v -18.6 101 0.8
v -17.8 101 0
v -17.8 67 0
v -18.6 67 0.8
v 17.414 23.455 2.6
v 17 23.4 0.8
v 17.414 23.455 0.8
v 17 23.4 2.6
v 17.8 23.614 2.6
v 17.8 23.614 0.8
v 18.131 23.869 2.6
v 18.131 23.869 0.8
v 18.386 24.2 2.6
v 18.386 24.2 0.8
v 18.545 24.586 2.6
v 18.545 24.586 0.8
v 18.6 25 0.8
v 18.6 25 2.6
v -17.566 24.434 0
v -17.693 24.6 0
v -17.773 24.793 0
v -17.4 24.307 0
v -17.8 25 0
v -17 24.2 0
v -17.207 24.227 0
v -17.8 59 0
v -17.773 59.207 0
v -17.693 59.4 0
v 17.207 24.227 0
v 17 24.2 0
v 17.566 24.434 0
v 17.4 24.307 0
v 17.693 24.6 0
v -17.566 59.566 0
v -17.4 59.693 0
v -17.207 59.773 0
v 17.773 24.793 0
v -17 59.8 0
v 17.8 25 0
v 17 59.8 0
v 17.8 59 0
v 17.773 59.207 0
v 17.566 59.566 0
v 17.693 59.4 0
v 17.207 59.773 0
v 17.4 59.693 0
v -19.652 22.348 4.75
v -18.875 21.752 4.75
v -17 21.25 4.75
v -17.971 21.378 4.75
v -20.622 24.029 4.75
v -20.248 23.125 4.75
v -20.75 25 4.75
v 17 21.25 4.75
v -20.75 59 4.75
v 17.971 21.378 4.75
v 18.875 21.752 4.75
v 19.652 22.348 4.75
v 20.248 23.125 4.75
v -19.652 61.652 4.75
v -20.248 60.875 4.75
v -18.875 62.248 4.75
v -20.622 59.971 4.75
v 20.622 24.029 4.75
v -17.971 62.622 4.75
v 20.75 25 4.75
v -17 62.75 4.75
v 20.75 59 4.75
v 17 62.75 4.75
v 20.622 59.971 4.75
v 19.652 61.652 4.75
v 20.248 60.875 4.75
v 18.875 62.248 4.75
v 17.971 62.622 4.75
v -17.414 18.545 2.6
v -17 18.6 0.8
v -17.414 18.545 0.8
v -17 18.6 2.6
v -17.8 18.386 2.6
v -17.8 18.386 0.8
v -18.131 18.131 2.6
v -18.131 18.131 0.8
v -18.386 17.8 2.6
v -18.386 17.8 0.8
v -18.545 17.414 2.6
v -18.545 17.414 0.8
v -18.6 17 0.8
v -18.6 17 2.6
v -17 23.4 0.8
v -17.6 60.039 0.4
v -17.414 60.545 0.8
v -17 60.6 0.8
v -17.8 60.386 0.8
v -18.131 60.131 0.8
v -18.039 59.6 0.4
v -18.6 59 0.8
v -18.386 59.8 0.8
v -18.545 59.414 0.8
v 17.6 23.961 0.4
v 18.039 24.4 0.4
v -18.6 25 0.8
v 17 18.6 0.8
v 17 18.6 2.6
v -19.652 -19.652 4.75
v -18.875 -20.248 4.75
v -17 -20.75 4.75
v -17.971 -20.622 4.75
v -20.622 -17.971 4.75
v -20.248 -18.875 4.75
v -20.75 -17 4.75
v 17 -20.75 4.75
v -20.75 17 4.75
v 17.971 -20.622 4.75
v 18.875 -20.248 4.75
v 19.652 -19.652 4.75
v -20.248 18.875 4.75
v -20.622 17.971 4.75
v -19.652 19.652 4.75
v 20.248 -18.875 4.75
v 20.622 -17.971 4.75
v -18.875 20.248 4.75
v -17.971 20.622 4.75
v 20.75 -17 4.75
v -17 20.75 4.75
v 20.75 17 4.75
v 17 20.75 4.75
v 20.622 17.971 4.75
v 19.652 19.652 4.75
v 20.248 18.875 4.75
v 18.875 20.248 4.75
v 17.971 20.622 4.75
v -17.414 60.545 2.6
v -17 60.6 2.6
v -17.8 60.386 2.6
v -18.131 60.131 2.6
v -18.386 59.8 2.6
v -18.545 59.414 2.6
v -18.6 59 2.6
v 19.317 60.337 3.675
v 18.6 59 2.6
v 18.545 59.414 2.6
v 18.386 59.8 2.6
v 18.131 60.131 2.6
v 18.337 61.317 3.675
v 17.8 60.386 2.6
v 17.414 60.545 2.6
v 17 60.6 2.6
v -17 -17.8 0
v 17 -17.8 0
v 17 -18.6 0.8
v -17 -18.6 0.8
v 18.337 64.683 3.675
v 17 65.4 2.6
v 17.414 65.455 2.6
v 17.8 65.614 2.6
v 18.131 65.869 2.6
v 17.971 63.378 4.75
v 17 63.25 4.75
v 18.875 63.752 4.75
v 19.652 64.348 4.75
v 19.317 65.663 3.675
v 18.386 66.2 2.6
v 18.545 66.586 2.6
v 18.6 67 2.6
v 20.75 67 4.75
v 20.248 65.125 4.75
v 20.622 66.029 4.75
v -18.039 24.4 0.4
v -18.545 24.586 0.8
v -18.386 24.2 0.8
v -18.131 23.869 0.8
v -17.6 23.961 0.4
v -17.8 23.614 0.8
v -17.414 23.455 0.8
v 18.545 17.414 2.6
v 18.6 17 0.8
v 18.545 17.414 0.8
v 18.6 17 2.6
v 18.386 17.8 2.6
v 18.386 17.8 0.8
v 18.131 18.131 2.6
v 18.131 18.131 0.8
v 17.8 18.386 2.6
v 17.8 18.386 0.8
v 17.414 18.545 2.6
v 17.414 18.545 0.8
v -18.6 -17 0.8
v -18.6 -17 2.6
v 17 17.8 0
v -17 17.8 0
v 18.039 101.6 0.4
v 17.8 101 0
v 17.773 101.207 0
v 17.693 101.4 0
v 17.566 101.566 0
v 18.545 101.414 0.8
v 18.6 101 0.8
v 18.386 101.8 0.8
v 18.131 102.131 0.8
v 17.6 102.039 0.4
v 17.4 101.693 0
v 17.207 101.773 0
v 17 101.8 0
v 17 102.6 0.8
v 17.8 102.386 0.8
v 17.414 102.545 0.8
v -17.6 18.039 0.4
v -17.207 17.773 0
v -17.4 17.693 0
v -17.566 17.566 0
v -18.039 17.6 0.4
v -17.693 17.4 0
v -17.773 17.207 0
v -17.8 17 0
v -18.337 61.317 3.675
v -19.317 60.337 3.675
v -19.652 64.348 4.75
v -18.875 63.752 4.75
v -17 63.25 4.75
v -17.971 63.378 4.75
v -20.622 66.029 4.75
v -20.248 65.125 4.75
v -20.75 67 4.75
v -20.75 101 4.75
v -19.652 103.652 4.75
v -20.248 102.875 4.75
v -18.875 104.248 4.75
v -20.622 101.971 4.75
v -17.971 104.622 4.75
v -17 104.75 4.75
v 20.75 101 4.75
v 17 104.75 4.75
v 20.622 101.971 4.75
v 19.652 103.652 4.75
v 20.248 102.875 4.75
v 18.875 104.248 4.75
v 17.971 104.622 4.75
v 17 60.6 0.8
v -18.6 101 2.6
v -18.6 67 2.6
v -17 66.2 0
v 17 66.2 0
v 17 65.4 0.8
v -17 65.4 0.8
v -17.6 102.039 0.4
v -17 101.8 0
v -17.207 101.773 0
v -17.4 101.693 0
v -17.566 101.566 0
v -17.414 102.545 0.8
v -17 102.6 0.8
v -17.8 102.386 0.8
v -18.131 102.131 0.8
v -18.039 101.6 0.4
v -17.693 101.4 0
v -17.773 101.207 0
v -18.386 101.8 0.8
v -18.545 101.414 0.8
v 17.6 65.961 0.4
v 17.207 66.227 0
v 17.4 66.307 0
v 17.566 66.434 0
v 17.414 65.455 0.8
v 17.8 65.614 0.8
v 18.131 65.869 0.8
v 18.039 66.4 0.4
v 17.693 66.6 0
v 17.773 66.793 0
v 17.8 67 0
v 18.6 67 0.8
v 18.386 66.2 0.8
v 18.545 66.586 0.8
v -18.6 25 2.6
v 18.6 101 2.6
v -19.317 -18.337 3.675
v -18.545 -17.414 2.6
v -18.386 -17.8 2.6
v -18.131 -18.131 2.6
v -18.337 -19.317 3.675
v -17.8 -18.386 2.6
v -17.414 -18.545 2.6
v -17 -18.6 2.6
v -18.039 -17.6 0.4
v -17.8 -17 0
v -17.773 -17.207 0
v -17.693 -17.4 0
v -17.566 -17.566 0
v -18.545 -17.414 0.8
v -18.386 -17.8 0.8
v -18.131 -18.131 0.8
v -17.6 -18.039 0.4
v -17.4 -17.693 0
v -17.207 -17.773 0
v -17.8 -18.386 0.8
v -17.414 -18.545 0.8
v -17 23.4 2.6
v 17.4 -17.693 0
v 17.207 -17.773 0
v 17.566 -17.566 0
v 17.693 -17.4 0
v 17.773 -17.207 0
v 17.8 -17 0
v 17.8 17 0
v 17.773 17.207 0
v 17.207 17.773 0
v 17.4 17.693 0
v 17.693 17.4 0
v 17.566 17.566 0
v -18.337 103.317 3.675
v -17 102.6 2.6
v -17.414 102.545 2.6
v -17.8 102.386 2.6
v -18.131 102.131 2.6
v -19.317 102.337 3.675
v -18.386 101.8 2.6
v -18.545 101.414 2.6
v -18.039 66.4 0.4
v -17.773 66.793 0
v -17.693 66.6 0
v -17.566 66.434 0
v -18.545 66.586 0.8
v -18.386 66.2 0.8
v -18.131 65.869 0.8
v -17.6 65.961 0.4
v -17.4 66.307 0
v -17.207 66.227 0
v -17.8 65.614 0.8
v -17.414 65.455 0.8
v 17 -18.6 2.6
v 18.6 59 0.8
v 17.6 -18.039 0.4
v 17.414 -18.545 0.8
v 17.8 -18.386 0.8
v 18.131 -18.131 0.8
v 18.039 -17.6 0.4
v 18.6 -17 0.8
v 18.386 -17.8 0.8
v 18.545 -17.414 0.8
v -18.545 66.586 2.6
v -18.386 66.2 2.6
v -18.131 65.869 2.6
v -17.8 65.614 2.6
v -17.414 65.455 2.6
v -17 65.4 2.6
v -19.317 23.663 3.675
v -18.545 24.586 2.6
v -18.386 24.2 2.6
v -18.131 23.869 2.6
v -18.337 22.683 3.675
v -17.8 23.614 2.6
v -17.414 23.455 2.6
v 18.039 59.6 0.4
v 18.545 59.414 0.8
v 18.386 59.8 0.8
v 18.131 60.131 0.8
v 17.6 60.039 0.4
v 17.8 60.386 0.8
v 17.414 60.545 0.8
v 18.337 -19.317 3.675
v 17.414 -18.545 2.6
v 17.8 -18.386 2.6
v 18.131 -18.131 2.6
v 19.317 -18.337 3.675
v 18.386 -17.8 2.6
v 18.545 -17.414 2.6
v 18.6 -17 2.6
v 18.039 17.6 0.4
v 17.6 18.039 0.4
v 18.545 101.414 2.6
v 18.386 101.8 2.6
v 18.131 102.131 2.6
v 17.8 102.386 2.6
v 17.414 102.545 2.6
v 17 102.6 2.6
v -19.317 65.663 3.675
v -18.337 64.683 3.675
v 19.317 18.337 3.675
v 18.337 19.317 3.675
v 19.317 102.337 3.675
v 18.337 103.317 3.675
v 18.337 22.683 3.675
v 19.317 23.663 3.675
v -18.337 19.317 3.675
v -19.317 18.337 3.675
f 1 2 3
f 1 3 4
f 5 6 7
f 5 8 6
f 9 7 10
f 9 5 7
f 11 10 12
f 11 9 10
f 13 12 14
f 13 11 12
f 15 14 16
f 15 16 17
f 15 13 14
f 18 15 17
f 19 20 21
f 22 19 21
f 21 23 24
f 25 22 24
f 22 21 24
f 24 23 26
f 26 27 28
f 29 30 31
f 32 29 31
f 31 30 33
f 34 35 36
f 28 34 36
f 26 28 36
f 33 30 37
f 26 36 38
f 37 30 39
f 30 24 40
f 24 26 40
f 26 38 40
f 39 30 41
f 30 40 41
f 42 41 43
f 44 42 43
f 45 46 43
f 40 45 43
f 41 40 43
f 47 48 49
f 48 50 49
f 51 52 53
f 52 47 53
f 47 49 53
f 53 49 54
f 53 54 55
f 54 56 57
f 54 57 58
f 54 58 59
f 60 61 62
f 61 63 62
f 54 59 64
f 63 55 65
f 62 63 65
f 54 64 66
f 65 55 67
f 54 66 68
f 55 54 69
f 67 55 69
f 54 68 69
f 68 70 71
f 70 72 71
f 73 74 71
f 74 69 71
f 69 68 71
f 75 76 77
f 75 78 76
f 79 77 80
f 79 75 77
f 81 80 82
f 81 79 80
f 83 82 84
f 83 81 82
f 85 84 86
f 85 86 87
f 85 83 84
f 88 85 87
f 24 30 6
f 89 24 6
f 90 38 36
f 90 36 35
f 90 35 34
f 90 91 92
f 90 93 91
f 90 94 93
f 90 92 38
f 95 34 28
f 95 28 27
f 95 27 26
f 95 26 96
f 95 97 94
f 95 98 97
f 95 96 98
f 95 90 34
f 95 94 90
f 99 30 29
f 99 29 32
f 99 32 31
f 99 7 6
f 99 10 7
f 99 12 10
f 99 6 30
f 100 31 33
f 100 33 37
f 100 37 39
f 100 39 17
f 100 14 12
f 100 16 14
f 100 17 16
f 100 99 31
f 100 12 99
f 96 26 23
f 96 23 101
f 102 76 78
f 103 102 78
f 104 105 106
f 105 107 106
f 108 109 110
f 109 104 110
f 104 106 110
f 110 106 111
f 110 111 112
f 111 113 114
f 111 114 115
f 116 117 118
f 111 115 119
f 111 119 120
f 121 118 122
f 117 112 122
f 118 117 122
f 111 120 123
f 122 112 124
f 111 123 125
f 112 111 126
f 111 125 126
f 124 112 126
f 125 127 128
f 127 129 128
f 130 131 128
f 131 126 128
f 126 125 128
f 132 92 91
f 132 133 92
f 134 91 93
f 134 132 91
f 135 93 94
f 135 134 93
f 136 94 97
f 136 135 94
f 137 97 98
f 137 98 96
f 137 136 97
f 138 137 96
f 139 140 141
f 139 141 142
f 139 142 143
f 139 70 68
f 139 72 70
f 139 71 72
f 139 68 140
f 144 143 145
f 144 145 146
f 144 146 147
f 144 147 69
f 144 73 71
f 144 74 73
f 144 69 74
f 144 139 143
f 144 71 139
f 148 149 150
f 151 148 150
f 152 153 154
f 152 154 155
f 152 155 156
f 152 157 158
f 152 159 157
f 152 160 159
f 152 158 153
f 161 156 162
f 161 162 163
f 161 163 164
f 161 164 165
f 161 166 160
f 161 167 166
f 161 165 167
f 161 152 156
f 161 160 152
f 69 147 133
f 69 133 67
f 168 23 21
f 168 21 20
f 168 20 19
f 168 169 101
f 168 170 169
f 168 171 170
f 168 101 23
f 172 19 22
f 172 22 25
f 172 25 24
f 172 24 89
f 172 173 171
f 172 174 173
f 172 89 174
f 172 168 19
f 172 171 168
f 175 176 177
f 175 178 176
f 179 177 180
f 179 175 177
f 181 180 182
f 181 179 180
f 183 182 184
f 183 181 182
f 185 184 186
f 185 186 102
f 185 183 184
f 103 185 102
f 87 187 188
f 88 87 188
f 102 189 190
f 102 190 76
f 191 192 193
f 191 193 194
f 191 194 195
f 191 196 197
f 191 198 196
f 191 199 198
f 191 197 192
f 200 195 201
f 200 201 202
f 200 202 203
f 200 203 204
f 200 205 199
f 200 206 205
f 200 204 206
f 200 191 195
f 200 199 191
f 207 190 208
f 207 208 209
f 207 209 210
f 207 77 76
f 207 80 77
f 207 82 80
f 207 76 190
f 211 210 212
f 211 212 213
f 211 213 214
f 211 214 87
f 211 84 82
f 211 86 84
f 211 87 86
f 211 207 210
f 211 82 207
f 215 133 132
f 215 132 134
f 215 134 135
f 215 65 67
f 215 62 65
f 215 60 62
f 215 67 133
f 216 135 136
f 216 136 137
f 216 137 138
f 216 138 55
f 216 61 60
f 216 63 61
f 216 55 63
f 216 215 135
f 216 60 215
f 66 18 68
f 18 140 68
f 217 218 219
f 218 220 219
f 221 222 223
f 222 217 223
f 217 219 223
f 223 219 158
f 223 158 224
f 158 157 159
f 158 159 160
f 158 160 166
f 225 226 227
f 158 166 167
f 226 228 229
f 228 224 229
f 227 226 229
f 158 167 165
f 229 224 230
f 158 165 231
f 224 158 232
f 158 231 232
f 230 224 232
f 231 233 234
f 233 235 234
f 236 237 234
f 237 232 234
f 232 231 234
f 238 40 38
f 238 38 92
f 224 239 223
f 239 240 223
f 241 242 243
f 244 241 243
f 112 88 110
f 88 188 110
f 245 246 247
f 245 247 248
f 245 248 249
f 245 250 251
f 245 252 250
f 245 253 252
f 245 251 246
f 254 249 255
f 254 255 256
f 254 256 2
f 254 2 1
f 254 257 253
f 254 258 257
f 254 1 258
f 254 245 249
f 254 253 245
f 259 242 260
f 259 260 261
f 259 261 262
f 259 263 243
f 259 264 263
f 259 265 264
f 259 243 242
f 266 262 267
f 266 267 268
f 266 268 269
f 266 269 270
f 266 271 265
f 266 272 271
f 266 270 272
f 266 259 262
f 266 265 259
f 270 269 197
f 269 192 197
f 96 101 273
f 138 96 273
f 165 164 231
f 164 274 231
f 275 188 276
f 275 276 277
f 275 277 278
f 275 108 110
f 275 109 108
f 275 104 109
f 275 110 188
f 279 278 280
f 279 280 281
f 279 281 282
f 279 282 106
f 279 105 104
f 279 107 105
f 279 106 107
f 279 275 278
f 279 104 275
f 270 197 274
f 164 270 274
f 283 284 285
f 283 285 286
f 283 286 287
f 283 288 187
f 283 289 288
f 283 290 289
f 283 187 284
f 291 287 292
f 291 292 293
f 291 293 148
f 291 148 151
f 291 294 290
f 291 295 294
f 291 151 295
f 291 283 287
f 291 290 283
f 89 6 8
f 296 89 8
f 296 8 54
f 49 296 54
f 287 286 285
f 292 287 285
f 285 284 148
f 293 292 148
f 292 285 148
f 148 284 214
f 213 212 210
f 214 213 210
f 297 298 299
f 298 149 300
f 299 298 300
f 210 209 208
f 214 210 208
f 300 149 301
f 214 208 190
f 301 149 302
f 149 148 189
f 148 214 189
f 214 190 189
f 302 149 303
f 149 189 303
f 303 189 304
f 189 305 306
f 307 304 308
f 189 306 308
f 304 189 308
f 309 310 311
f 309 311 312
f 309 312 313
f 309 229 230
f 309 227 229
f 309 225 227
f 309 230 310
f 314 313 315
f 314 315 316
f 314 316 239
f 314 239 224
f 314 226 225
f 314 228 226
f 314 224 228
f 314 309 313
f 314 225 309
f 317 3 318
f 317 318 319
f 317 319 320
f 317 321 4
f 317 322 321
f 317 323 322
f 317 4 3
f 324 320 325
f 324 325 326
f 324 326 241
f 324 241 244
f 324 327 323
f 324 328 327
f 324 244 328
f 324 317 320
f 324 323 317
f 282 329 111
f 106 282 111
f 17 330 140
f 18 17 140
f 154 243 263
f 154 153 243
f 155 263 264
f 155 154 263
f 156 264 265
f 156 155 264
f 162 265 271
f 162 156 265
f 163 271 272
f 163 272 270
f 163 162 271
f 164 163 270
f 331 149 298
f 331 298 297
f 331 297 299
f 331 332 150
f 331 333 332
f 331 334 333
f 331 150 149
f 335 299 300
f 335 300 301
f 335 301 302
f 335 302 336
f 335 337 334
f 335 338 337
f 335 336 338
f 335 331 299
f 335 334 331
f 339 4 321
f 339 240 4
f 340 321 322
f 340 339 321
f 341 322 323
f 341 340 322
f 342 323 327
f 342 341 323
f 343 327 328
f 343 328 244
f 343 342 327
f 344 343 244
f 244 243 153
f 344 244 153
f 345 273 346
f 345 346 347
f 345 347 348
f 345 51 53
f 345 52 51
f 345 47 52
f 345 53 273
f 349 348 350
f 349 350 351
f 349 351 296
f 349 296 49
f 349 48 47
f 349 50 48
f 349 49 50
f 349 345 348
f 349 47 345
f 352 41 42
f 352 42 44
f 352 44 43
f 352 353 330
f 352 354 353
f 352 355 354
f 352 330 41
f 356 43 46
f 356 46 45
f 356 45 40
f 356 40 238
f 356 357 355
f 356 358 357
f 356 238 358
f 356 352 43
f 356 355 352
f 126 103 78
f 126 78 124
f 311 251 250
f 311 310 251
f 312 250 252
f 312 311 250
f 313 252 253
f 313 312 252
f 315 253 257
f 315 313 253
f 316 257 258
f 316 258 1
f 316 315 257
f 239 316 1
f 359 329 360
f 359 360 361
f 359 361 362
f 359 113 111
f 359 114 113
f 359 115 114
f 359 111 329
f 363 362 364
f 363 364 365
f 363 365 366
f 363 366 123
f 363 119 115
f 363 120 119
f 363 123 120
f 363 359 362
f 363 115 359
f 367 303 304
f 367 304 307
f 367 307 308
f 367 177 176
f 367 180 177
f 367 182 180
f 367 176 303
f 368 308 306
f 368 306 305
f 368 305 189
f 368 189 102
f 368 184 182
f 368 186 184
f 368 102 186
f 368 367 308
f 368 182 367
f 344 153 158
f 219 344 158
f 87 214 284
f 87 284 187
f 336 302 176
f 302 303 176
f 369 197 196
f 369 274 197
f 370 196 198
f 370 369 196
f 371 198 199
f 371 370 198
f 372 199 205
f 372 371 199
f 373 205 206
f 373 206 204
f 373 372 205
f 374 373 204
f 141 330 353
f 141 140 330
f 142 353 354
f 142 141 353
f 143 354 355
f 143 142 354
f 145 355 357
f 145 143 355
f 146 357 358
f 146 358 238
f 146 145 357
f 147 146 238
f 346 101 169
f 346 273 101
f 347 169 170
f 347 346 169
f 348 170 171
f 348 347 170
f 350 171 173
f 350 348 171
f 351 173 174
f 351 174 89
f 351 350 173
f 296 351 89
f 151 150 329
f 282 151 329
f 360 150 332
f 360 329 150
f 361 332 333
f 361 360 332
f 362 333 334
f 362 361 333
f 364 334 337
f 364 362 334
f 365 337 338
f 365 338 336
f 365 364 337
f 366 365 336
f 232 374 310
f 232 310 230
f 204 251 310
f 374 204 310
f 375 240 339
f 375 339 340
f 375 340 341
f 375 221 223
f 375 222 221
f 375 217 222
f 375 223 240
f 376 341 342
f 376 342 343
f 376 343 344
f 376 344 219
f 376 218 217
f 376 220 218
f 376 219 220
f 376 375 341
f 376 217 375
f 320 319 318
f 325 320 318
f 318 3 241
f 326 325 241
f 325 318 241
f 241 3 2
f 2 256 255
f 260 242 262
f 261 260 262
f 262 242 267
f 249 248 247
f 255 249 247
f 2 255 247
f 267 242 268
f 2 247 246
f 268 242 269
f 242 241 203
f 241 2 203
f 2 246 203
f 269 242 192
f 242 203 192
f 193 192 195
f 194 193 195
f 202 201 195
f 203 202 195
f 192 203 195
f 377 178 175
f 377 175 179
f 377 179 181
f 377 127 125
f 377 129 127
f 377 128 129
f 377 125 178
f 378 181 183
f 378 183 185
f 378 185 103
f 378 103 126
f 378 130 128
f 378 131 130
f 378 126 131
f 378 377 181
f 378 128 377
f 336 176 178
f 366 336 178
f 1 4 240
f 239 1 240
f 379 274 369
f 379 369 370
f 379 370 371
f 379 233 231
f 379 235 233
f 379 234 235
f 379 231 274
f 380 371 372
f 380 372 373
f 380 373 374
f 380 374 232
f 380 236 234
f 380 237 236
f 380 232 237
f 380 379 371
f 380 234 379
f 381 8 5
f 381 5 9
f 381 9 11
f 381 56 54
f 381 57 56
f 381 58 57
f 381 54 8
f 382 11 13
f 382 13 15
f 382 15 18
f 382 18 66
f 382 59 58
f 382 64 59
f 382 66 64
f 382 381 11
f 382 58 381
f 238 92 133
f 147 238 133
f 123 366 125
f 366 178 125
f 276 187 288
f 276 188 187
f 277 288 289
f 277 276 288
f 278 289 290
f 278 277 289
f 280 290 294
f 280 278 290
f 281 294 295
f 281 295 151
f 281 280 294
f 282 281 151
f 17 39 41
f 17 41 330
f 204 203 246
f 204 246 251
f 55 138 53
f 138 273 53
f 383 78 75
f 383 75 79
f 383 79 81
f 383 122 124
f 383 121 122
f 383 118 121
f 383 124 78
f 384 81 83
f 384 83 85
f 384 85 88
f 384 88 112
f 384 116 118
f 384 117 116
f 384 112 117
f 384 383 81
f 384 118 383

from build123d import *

# Parameters (mm, degrees)
PAD001_DEPTH           = 4.75
LINEARPATTERN003_COUNT = 3
LINEARPATTERN003_PITCH = 42


with BuildPart() as part:
    # AdditivePipe: sweep along a path in Sketch004
    with BuildLine(Plane.XY) as additivepipe_path:
        Line((-17, -20.75), (17, -20.75))
        ThreePointArc((17, -20.75), (19.65165, -19.65165), (20.75, -17))
        Line((20.75, -17), (20.75, 17))
        ThreePointArc((20.75, 17), (19.65165, 19.65165), (17, 20.75))
        Line((17, 20.75), (-17, 20.75))
        ThreePointArc((-17, 20.75), (-19.65165, 19.65165), (-20.75, 17))
        Line((-20.75, 17), (-20.75, -17))
        ThreePointArc((-20.75, -17), (-19.65165, -19.65165), (-17, -20.75))
    # Sketch005 → AdditivePipe (sweep)
    with BuildSketch(Plane.XZ):
        Polygon((20.75, 4.75), (18.6, 2.6), (18.6, 0.8), (17.8, 0), (17.8, 4.75), align=None)
    additivepipe = sweep(path=additivepipe_path.line)

    # Sketch006 → Pad001 (new body)
    with BuildSketch(Plane.XY):
        with BuildLine():
            Line((-17, -17.8), (17, -17.8))
            ThreePointArc((17, -17.8), (17.565685, -17.565685), (17.8, -17))
            Line((17.8, -17), (17.8, 17))
            ThreePointArc((17.8, 17), (17.565685, 17.565685), (17, 17.8))
            Line((17, 17.8), (-17, 17.8))
            ThreePointArc((-17, 17.8), (-17.565685, 17.565685), (-17.8, 17))
            Line((-17.8, 17), (-17.8, -17))
            ThreePointArc((-17.8, -17), (-17.565685, -17.565685), (-17, -17.8))
        make_face()
    pad001 = extrude(amount=PAD001_DEPTH)

    # LinearPattern003: AdditivePipe, Pad001 ×3
    with Locations(*[(0, i * LINEARPATTERN003_PITCH, 0) for i in range(1, LINEARPATTERN003_COUNT)]):
        add(additivepipe)
        add(pad001)


solid = part.part
